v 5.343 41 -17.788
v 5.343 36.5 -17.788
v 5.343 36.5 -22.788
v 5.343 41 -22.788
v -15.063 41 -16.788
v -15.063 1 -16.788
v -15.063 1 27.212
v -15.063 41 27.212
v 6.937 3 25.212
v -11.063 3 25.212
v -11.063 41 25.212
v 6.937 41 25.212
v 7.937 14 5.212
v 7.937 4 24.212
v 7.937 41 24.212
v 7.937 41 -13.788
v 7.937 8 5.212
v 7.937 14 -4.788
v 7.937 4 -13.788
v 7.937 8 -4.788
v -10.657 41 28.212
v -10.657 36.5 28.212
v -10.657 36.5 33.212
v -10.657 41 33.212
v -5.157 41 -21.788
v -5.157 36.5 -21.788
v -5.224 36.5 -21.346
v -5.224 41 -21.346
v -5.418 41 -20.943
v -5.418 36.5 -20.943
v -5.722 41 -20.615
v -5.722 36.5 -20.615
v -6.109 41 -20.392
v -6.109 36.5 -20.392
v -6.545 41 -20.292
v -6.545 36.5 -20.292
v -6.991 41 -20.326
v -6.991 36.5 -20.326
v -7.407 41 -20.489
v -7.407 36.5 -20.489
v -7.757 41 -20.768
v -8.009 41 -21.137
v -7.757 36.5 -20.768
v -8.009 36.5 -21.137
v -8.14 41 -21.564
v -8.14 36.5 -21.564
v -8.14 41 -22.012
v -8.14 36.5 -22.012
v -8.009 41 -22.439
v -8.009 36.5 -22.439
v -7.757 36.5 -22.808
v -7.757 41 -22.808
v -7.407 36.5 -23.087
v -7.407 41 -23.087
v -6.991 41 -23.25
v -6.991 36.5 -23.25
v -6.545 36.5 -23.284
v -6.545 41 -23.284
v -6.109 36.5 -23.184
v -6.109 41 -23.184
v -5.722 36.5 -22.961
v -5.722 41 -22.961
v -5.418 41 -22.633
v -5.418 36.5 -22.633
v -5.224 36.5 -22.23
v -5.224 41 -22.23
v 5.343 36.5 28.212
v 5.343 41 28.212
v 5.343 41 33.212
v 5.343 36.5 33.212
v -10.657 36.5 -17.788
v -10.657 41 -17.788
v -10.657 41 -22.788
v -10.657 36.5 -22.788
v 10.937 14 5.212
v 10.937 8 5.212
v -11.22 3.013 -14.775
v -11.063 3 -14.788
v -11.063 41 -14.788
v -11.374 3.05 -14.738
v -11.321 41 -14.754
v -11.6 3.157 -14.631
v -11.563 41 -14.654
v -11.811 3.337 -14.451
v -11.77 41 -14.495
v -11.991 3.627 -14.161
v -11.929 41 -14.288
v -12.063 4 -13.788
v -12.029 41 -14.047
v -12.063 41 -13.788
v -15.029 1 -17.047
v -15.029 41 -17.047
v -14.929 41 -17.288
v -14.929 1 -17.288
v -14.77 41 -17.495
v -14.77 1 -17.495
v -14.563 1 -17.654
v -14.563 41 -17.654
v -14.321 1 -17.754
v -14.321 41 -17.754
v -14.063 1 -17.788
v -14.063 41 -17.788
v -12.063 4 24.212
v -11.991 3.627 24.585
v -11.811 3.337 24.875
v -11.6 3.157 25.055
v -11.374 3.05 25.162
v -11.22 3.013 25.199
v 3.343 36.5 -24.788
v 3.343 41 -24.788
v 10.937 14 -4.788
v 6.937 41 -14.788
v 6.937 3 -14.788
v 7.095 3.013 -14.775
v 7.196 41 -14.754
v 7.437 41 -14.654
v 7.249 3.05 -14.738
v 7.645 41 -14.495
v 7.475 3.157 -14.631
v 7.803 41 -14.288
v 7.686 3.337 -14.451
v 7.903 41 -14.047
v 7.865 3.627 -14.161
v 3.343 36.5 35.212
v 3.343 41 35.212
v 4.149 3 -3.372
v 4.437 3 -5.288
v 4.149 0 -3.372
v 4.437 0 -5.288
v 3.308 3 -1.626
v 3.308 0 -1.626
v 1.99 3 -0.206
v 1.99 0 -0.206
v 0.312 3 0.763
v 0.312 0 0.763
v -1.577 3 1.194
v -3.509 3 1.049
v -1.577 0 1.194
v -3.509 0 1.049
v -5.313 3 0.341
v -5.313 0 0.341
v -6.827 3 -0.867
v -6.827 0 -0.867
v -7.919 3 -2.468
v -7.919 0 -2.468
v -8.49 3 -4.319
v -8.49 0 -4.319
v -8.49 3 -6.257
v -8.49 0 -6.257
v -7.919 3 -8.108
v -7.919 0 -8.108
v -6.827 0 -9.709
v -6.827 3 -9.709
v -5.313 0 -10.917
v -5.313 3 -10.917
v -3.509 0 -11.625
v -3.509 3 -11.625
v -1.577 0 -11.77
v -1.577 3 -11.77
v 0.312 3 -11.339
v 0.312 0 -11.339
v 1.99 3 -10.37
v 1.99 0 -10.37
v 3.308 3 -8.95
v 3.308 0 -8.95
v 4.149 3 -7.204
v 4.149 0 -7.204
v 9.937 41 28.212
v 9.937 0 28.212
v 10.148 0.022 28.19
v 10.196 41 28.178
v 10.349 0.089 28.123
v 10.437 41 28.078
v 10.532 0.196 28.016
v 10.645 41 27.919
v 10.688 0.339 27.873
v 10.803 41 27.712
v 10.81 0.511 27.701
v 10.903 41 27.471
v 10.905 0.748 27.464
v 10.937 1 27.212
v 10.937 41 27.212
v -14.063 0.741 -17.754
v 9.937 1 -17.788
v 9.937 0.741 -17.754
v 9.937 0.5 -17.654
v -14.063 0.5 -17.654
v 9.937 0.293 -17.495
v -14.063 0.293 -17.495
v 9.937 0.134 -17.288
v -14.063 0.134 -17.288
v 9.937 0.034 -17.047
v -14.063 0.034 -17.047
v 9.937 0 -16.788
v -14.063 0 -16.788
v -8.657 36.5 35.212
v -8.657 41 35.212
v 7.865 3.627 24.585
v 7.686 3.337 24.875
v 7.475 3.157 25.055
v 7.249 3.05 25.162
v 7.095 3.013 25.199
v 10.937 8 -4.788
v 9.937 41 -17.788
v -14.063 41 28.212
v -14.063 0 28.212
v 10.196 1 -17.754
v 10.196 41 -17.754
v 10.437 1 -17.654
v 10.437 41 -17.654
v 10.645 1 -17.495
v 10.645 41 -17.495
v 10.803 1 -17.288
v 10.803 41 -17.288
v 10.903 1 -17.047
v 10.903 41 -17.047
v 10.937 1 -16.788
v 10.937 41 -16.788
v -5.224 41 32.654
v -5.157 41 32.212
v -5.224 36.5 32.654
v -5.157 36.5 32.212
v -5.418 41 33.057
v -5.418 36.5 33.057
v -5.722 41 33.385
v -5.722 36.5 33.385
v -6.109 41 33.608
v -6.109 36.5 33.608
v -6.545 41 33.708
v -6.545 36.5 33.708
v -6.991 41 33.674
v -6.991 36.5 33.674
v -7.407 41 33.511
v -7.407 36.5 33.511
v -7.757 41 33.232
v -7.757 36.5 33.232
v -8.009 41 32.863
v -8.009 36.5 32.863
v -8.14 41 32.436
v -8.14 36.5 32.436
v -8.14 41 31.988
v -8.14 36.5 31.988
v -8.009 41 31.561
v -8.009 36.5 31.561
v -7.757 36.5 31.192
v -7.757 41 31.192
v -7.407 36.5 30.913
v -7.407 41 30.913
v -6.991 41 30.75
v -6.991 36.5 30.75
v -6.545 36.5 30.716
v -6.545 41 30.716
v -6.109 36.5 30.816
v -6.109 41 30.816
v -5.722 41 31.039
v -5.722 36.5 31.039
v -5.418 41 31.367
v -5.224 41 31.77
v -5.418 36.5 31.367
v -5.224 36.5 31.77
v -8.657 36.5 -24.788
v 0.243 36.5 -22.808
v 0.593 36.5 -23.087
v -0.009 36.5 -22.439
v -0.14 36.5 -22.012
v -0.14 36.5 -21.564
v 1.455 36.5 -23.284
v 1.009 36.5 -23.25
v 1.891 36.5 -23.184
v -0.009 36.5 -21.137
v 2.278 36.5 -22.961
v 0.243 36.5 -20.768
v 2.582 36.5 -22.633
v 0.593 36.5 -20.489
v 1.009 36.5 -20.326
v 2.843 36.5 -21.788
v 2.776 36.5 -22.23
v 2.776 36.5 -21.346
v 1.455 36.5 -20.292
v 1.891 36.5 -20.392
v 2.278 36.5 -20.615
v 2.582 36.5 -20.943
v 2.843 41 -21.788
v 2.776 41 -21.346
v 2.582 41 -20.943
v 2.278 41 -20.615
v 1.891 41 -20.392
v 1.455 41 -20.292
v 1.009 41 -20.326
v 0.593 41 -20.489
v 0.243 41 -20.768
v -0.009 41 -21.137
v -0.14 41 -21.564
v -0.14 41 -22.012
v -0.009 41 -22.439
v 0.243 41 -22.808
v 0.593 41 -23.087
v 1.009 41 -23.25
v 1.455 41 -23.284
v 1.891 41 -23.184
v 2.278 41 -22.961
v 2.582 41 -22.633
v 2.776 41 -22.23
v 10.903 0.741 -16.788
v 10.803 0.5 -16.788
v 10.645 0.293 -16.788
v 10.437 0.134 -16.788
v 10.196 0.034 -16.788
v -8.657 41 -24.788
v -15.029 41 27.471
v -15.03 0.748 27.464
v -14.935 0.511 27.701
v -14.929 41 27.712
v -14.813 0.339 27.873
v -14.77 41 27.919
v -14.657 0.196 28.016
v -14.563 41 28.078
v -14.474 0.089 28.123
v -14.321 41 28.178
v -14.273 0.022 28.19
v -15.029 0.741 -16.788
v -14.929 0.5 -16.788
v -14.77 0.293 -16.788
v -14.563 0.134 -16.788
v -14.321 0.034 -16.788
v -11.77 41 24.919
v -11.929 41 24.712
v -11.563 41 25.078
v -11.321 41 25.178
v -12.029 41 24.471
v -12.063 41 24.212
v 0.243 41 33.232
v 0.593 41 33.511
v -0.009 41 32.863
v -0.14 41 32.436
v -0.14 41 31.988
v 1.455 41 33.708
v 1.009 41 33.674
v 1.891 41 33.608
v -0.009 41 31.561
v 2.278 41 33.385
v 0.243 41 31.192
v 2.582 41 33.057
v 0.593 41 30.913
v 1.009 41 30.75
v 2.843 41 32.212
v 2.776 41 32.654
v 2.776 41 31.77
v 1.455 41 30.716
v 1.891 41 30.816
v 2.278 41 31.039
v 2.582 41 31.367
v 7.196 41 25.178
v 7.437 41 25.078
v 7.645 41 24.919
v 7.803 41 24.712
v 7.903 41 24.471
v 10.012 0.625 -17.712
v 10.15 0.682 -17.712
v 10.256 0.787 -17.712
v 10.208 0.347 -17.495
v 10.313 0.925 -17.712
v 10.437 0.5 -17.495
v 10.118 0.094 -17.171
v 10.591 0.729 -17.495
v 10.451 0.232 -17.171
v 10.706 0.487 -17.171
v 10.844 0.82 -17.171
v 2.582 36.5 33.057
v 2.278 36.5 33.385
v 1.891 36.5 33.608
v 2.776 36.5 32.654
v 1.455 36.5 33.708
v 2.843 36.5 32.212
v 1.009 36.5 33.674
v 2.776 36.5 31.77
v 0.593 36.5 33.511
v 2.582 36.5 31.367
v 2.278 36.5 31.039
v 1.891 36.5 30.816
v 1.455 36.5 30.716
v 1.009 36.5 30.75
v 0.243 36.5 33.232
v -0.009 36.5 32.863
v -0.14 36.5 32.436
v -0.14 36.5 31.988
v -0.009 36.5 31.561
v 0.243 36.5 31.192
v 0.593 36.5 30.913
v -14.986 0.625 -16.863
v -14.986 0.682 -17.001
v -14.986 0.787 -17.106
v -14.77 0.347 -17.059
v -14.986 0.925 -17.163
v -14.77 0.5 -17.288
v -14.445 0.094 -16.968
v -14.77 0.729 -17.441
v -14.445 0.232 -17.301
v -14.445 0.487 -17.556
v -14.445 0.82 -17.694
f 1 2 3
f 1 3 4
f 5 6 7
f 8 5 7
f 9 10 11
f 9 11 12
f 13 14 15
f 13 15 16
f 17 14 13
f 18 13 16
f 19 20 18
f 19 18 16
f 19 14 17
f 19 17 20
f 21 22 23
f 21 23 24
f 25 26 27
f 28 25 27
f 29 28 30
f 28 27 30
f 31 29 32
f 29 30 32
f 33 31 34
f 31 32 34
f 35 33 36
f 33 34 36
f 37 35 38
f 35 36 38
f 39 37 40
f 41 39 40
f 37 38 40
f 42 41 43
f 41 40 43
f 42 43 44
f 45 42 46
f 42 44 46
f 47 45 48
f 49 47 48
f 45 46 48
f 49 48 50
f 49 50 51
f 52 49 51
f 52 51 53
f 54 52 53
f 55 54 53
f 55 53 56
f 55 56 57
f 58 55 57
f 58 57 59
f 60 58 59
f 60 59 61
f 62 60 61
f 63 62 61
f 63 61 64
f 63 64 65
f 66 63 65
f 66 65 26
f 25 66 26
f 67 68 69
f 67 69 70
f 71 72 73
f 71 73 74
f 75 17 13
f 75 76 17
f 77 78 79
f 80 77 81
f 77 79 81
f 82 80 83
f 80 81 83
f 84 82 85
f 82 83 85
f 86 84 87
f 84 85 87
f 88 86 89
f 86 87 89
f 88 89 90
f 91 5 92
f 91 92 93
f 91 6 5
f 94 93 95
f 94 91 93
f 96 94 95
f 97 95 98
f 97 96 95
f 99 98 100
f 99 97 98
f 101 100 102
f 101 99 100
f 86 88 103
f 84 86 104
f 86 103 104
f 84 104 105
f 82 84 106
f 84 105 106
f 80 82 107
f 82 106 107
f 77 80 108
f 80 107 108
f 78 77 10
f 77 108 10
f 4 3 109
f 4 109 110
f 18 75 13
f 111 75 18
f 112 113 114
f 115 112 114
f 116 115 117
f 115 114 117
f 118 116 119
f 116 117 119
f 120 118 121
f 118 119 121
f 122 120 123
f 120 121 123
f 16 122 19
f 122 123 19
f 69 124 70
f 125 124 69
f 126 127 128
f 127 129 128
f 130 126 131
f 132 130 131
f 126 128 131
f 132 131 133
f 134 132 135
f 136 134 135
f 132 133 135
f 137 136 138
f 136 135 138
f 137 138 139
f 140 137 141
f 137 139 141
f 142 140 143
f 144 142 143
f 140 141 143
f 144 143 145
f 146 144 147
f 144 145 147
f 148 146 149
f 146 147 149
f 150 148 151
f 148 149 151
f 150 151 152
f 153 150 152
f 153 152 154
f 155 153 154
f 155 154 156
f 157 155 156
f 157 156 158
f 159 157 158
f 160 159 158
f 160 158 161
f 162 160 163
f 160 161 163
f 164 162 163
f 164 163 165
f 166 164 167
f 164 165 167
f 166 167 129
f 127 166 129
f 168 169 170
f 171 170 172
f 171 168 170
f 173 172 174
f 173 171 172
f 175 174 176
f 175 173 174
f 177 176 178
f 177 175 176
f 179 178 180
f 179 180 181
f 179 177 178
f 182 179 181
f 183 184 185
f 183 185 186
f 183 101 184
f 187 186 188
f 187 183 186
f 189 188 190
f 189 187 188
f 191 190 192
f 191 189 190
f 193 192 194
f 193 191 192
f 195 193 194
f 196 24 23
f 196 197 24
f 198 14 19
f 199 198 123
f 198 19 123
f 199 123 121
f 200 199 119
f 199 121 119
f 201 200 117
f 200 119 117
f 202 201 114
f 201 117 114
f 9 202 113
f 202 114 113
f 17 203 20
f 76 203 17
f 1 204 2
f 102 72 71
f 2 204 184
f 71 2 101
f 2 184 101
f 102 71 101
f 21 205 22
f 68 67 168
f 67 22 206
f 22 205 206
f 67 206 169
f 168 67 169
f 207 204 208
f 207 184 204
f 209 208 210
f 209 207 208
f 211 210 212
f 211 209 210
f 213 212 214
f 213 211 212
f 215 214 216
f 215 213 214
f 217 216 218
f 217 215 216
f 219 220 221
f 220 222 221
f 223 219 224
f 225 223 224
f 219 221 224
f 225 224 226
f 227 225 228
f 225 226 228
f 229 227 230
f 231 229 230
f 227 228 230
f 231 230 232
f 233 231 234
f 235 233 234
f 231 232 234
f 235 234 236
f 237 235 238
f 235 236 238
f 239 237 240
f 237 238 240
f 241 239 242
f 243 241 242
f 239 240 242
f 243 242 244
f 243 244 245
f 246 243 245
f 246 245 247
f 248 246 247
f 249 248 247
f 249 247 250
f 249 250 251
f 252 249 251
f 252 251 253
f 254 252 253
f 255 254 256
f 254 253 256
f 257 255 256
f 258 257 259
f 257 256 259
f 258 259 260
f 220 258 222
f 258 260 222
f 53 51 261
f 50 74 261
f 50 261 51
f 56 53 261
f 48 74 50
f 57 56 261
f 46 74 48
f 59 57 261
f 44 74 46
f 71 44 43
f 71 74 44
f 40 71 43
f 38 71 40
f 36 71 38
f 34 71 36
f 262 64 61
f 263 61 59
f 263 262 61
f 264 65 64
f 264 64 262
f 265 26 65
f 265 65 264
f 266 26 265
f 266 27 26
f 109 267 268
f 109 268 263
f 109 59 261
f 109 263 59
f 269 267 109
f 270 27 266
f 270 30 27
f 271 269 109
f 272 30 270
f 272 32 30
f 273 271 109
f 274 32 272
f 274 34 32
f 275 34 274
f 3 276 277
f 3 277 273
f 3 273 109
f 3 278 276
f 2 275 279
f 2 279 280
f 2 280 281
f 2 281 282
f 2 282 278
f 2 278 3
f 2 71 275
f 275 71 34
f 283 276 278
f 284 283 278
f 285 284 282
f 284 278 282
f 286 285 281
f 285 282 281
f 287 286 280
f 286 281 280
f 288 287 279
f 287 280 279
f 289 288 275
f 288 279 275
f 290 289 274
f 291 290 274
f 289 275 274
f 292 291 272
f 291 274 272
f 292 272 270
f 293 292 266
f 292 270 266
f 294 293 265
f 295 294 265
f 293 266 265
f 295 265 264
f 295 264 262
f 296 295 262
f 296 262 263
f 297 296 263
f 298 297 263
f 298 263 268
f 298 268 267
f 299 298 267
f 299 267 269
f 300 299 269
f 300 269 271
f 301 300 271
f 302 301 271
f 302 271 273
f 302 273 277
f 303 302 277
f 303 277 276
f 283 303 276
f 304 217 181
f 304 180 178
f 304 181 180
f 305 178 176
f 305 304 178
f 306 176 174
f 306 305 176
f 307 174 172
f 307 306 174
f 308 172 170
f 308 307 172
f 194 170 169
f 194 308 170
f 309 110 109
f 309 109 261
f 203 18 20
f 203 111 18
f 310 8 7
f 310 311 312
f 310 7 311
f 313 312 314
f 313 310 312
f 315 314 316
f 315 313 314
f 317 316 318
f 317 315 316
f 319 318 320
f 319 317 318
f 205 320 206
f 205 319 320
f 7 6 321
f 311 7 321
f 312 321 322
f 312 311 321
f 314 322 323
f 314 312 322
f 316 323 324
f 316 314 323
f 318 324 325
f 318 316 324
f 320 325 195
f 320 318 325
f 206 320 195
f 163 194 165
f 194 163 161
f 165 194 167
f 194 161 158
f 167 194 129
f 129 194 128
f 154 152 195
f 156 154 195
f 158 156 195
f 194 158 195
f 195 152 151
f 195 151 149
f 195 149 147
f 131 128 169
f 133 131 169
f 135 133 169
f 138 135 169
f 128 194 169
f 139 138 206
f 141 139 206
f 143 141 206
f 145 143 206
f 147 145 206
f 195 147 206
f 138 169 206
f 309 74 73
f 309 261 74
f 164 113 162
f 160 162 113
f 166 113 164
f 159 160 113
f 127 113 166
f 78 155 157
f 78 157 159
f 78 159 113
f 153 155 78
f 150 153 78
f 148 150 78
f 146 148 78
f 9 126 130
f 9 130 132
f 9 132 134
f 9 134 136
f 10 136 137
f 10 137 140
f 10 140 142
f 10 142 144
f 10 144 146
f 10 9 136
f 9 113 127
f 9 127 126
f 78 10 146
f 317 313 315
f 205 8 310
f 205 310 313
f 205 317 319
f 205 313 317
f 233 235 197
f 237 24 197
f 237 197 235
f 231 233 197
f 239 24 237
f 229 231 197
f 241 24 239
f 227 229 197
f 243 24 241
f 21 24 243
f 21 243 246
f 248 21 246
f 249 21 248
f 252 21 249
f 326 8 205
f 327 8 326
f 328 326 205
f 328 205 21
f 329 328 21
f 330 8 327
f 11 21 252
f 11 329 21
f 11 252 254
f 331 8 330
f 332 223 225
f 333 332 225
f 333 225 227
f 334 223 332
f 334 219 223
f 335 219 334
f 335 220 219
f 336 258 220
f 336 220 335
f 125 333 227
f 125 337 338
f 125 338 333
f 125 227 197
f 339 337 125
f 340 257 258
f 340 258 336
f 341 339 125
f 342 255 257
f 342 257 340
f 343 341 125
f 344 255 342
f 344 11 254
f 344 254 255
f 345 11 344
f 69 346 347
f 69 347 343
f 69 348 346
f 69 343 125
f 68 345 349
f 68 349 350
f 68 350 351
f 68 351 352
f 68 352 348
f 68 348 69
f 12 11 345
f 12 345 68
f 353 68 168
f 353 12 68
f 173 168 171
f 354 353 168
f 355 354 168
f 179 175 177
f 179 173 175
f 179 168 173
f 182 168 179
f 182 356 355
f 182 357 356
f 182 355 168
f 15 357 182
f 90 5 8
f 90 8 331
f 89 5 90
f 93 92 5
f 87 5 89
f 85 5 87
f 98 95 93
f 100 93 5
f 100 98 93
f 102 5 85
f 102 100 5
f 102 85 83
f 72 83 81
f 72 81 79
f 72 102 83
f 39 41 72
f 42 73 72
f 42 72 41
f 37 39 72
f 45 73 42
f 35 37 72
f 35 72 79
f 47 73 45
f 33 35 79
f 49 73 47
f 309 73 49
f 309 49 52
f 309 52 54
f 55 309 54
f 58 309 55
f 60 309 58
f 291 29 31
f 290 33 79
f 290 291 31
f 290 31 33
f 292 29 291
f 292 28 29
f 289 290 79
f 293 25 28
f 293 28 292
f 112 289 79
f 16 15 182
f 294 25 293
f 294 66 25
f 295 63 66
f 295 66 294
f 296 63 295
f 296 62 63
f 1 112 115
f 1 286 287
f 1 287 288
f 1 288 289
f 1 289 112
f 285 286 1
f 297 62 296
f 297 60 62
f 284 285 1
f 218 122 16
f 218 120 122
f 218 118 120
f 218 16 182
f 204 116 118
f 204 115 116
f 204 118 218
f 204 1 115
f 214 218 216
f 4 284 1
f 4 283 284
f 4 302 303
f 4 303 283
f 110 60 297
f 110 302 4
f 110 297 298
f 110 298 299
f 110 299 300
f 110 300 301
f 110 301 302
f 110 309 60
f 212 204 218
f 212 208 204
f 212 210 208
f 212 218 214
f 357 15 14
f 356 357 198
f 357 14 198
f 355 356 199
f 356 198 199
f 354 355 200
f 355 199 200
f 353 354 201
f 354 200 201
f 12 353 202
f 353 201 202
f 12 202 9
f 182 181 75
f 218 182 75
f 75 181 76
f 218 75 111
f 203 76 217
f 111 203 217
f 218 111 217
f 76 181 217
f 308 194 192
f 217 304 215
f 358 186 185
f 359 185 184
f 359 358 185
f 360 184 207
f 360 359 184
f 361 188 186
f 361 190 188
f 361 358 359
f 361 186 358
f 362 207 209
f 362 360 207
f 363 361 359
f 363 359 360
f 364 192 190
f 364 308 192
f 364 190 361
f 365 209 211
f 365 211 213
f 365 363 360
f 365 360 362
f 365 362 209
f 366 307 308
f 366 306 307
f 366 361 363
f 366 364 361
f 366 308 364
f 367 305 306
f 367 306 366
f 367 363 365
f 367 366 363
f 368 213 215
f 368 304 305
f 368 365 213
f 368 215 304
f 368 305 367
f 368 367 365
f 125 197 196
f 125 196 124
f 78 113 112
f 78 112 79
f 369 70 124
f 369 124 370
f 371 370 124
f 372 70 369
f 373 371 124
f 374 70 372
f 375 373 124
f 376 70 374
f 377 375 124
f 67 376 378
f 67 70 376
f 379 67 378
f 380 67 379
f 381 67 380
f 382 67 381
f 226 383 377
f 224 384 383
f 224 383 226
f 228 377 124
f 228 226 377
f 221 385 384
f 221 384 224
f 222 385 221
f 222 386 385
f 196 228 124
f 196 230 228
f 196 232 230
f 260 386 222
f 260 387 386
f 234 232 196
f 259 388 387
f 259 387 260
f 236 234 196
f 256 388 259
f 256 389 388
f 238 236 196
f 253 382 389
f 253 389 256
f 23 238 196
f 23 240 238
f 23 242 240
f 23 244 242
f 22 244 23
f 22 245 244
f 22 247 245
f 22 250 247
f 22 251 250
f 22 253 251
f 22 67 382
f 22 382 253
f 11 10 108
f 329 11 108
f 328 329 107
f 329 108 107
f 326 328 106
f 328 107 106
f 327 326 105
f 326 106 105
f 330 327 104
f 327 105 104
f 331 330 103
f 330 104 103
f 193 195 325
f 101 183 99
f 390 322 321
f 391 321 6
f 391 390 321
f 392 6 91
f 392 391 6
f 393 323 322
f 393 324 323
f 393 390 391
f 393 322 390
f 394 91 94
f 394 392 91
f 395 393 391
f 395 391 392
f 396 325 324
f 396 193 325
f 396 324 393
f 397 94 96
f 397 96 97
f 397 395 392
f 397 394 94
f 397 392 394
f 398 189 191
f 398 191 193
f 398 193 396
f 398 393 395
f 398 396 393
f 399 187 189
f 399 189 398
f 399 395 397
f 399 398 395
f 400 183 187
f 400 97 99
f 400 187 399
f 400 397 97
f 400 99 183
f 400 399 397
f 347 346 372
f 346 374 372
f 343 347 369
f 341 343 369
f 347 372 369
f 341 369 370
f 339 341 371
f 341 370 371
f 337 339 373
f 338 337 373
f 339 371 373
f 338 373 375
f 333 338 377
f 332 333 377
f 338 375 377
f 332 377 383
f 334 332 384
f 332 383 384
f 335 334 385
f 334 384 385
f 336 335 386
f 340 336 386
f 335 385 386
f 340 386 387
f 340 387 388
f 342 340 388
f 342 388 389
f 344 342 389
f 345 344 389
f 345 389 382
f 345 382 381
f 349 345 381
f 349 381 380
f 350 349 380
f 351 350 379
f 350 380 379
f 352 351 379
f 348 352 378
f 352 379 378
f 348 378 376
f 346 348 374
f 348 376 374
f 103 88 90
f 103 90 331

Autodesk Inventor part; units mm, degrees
ref_plane "YZ Plane" through (0, 0, 0) normal (1, 0, 0) x (0, 1, 0)
ref_plane "XZ Plane" through (0, 0, 0) normal (0, 1, 0) x (-1, 0, 0)
ref_plane "XY Plane" through (0, 0, 0) normal (0, 0, 1) x (1, 0, 0)
sketch "Sketch1" plane through (0, 0, 0) normal (0, 1, 0) x (-1, 0, 0)
  line L0 (12.0626, 25.212) -> (-7.9374, 25.212)
  line L1 (-7.9374, 25.212) -> (-7.9374, -14.788)
  line L2 (-7.9374, -14.788) -> (12.0626, -14.788)
  line L3 (12.0626, -14.788) -> (12.0626, 25.212)
  line L4 (12.0626, 25.212) -> (-7.9374, -14.788) construction
  line L5 (-7.9374, 25.212) -> (12.0626, -14.788) construction
  point P0 (0, 0)
  point P1 (2.0626, 5.212)
  dimension "d0" = 20
  dimension "d1" = 40
extrude "Extrusion1" add sketch "Sketch1" along normal blind 3
sketch "Sketch2" plane through (0, 3, 0) normal (0, 1, 0) x (1, 0, 0)
  line L0 (-15.0626, -28.212) -> (10.9374, -28.212)
  line L1 (10.9374, -28.212) -> (10.9374, 17.788)
  line L2 (10.9374, 17.788) -> (-15.0626, 17.788)
  line L3 (-15.0626, 17.788) -> (-15.0626, -28.212)
  line L4 (-15.0626, -28.212) -> (10.9374, 17.788) construction
  line L5 (10.9374, -28.212) -> (-15.0626, 17.788) construction
  line L6 (-12.0626, 14.788) -> (-12.0626, -25.212) projected
  line L7 (-12.0626, -25.212) -> (7.9374, -25.212) projected
  line L8 (7.9374, 14.788) -> (-12.0626, 14.788)
  line L9 (-12.0626, 14.788) -> (-12.0626, -25.212)
  line L10 (-12.0626, -25.212) -> (7.9374, -25.212)
  line L11 (7.9374, -25.212) -> (7.9374, 14.788)
  line L12 (7.9374, 14.788) -> (-12.0626, -25.212) construction
  line L13 (-12.0626, 14.788) -> (7.9374, -25.212) construction
  point P0 (0, 0)
  point P1 (-2.0626, -5.212)
  point P2 (7.9374, -25.212)
  dimension "d4" = 26
  dimension "d5" = 46
  dimension "d6" = 3
  dimension "d7" = 3
extrude "Extrusion2" add sketch "Sketch2" along normal blind 38 and the other way blind 3
fillet "Fillet1" radius 1 13 edges at (10.9374, 0, 5.212) (-2.0626, 0, -17.788) (10.9374, 20.5, -17.788) (-15.0626, 20.5, -17.788) (-15.0626, 0, 5.212) (10.9374, 20.5, 28.212) (-15.0626, 20.5, 28.212) (-12.0626, 22, -14.788) (-12.0626, 3, 5.212) (7.9374, 3, 5.212) (7.9374, 22, -14.788) (7.9374, 22, 25.212) (-12.0626, 22, 25.212)
sketch "Sketch8" plane through (10.9374, 1, 27.212) normal (1, 0, 0) x (0, 0, -1)
  line L0 (32, 7) -> (22, 7)
  line L1 (22, 7) -> (22, 13)
  line L2 (22, 13) -> (32, 13)
  line L3 (32, 13) -> (32, 7)
  line L4 (-1, -1) -> (44, -1) projected
  line L5 (45, 0) -> (45, 40) projected
  point P0 (27.212, -1)
  point P1 (27, 7)
  dimension "d25" = 10
  dimension "d26" = 6
  dimension "d27" = 8
  dimension "d28" = 13
extrude "Extrusion4" cut sketch "Sketch8" against normal blind 3
sketch "Sketch9" plane through (0, 0, 0) normal (0, -1, 0) x (1, 0, 0)
  circle A0 centre (-2.0626, -5.288) radius 6.5
  line L0 (-14.0626, -17.788) -> (9.9374, -17.788) projected
  line L1 (10.9374, -16.788) -> (10.9374, 27.212) projected
  point P0 (0, 0)
  dimension "d31" = 13
  dimension "d32" = 12.5
  dimension "d36" = 13
extrude "Extrusion5" cut sketch "Sketch9" against normal blind 3
sketch "Sketch11" plane through (-14.0626, 0, 28.212) normal (0, 0, 1) x (1, 0, 0)
  line L0 (19.4055, 36.5) -> (3.4055, 36.5)
  line L1 (3.4055, 36.5) -> (3.4055, 41)
  line L2 (3.4055, 41) -> (19.4055, 41)
  line L3 (19.4055, 41) -> (19.4055, 36.5)
  line L4 (0, 41) -> (24, 41) projected
  point P0 (14.0626, 0)
  point P1 (11.4055, 41)
  dimension "d37" = 16
  dimension "d38" = 4.5
  dimension "d39" = 0
extrude "Extrusion6" add sketch "Sketch11" along normal blind 7
chamfer "Chamfer1" distance 2 angle 45 2 edges at (-10.6572, 38.75, 35.212) (5.3428, 38.75, 35.212)
sketch "Sketch12" plane through (-10.6572, 36.5, 28.212) normal (0, -1, 0) x (1, 0, 0)
  point P0 (10.6572, -28.212)
sketch "Sketch13" plane through (-10.6572, 36.5, 28.212) normal (0, -1, 0) x (1, 0, 0)
  circle A0 centre (12, 4) radius 1.5
  circle A1 centre (4, 4) radius 1.5
  line L0 (16, 0) -> (16, 5) projected
  line L1 (2, 7) -> (14, 7) projected
  line L2 (0, 0) -> (0, 5) projected
  point P0 (10.6572, -28.212)
  dimension "d45" = 3
  dimension "d46" = 3
  dimension "d47" = 4
  dimension "d48" = 3
  dimension "d49" = 4
  dimension "d50" = 3
extrude "Extrusion7" cut sketch "Sketch13" against normal blind 7
ref_plane "Work Plane1" through (-14.0626, 0, 5.212) normal (0, 0, 1) x (1, 0, 0)
mirror "Mirror1" about plane through (-14.0626, 0, 5.212) normal (0, 0, 1) of "Extrusion6", "Extrusion7", "Chamfer1"
properties part number "servo_holder"
